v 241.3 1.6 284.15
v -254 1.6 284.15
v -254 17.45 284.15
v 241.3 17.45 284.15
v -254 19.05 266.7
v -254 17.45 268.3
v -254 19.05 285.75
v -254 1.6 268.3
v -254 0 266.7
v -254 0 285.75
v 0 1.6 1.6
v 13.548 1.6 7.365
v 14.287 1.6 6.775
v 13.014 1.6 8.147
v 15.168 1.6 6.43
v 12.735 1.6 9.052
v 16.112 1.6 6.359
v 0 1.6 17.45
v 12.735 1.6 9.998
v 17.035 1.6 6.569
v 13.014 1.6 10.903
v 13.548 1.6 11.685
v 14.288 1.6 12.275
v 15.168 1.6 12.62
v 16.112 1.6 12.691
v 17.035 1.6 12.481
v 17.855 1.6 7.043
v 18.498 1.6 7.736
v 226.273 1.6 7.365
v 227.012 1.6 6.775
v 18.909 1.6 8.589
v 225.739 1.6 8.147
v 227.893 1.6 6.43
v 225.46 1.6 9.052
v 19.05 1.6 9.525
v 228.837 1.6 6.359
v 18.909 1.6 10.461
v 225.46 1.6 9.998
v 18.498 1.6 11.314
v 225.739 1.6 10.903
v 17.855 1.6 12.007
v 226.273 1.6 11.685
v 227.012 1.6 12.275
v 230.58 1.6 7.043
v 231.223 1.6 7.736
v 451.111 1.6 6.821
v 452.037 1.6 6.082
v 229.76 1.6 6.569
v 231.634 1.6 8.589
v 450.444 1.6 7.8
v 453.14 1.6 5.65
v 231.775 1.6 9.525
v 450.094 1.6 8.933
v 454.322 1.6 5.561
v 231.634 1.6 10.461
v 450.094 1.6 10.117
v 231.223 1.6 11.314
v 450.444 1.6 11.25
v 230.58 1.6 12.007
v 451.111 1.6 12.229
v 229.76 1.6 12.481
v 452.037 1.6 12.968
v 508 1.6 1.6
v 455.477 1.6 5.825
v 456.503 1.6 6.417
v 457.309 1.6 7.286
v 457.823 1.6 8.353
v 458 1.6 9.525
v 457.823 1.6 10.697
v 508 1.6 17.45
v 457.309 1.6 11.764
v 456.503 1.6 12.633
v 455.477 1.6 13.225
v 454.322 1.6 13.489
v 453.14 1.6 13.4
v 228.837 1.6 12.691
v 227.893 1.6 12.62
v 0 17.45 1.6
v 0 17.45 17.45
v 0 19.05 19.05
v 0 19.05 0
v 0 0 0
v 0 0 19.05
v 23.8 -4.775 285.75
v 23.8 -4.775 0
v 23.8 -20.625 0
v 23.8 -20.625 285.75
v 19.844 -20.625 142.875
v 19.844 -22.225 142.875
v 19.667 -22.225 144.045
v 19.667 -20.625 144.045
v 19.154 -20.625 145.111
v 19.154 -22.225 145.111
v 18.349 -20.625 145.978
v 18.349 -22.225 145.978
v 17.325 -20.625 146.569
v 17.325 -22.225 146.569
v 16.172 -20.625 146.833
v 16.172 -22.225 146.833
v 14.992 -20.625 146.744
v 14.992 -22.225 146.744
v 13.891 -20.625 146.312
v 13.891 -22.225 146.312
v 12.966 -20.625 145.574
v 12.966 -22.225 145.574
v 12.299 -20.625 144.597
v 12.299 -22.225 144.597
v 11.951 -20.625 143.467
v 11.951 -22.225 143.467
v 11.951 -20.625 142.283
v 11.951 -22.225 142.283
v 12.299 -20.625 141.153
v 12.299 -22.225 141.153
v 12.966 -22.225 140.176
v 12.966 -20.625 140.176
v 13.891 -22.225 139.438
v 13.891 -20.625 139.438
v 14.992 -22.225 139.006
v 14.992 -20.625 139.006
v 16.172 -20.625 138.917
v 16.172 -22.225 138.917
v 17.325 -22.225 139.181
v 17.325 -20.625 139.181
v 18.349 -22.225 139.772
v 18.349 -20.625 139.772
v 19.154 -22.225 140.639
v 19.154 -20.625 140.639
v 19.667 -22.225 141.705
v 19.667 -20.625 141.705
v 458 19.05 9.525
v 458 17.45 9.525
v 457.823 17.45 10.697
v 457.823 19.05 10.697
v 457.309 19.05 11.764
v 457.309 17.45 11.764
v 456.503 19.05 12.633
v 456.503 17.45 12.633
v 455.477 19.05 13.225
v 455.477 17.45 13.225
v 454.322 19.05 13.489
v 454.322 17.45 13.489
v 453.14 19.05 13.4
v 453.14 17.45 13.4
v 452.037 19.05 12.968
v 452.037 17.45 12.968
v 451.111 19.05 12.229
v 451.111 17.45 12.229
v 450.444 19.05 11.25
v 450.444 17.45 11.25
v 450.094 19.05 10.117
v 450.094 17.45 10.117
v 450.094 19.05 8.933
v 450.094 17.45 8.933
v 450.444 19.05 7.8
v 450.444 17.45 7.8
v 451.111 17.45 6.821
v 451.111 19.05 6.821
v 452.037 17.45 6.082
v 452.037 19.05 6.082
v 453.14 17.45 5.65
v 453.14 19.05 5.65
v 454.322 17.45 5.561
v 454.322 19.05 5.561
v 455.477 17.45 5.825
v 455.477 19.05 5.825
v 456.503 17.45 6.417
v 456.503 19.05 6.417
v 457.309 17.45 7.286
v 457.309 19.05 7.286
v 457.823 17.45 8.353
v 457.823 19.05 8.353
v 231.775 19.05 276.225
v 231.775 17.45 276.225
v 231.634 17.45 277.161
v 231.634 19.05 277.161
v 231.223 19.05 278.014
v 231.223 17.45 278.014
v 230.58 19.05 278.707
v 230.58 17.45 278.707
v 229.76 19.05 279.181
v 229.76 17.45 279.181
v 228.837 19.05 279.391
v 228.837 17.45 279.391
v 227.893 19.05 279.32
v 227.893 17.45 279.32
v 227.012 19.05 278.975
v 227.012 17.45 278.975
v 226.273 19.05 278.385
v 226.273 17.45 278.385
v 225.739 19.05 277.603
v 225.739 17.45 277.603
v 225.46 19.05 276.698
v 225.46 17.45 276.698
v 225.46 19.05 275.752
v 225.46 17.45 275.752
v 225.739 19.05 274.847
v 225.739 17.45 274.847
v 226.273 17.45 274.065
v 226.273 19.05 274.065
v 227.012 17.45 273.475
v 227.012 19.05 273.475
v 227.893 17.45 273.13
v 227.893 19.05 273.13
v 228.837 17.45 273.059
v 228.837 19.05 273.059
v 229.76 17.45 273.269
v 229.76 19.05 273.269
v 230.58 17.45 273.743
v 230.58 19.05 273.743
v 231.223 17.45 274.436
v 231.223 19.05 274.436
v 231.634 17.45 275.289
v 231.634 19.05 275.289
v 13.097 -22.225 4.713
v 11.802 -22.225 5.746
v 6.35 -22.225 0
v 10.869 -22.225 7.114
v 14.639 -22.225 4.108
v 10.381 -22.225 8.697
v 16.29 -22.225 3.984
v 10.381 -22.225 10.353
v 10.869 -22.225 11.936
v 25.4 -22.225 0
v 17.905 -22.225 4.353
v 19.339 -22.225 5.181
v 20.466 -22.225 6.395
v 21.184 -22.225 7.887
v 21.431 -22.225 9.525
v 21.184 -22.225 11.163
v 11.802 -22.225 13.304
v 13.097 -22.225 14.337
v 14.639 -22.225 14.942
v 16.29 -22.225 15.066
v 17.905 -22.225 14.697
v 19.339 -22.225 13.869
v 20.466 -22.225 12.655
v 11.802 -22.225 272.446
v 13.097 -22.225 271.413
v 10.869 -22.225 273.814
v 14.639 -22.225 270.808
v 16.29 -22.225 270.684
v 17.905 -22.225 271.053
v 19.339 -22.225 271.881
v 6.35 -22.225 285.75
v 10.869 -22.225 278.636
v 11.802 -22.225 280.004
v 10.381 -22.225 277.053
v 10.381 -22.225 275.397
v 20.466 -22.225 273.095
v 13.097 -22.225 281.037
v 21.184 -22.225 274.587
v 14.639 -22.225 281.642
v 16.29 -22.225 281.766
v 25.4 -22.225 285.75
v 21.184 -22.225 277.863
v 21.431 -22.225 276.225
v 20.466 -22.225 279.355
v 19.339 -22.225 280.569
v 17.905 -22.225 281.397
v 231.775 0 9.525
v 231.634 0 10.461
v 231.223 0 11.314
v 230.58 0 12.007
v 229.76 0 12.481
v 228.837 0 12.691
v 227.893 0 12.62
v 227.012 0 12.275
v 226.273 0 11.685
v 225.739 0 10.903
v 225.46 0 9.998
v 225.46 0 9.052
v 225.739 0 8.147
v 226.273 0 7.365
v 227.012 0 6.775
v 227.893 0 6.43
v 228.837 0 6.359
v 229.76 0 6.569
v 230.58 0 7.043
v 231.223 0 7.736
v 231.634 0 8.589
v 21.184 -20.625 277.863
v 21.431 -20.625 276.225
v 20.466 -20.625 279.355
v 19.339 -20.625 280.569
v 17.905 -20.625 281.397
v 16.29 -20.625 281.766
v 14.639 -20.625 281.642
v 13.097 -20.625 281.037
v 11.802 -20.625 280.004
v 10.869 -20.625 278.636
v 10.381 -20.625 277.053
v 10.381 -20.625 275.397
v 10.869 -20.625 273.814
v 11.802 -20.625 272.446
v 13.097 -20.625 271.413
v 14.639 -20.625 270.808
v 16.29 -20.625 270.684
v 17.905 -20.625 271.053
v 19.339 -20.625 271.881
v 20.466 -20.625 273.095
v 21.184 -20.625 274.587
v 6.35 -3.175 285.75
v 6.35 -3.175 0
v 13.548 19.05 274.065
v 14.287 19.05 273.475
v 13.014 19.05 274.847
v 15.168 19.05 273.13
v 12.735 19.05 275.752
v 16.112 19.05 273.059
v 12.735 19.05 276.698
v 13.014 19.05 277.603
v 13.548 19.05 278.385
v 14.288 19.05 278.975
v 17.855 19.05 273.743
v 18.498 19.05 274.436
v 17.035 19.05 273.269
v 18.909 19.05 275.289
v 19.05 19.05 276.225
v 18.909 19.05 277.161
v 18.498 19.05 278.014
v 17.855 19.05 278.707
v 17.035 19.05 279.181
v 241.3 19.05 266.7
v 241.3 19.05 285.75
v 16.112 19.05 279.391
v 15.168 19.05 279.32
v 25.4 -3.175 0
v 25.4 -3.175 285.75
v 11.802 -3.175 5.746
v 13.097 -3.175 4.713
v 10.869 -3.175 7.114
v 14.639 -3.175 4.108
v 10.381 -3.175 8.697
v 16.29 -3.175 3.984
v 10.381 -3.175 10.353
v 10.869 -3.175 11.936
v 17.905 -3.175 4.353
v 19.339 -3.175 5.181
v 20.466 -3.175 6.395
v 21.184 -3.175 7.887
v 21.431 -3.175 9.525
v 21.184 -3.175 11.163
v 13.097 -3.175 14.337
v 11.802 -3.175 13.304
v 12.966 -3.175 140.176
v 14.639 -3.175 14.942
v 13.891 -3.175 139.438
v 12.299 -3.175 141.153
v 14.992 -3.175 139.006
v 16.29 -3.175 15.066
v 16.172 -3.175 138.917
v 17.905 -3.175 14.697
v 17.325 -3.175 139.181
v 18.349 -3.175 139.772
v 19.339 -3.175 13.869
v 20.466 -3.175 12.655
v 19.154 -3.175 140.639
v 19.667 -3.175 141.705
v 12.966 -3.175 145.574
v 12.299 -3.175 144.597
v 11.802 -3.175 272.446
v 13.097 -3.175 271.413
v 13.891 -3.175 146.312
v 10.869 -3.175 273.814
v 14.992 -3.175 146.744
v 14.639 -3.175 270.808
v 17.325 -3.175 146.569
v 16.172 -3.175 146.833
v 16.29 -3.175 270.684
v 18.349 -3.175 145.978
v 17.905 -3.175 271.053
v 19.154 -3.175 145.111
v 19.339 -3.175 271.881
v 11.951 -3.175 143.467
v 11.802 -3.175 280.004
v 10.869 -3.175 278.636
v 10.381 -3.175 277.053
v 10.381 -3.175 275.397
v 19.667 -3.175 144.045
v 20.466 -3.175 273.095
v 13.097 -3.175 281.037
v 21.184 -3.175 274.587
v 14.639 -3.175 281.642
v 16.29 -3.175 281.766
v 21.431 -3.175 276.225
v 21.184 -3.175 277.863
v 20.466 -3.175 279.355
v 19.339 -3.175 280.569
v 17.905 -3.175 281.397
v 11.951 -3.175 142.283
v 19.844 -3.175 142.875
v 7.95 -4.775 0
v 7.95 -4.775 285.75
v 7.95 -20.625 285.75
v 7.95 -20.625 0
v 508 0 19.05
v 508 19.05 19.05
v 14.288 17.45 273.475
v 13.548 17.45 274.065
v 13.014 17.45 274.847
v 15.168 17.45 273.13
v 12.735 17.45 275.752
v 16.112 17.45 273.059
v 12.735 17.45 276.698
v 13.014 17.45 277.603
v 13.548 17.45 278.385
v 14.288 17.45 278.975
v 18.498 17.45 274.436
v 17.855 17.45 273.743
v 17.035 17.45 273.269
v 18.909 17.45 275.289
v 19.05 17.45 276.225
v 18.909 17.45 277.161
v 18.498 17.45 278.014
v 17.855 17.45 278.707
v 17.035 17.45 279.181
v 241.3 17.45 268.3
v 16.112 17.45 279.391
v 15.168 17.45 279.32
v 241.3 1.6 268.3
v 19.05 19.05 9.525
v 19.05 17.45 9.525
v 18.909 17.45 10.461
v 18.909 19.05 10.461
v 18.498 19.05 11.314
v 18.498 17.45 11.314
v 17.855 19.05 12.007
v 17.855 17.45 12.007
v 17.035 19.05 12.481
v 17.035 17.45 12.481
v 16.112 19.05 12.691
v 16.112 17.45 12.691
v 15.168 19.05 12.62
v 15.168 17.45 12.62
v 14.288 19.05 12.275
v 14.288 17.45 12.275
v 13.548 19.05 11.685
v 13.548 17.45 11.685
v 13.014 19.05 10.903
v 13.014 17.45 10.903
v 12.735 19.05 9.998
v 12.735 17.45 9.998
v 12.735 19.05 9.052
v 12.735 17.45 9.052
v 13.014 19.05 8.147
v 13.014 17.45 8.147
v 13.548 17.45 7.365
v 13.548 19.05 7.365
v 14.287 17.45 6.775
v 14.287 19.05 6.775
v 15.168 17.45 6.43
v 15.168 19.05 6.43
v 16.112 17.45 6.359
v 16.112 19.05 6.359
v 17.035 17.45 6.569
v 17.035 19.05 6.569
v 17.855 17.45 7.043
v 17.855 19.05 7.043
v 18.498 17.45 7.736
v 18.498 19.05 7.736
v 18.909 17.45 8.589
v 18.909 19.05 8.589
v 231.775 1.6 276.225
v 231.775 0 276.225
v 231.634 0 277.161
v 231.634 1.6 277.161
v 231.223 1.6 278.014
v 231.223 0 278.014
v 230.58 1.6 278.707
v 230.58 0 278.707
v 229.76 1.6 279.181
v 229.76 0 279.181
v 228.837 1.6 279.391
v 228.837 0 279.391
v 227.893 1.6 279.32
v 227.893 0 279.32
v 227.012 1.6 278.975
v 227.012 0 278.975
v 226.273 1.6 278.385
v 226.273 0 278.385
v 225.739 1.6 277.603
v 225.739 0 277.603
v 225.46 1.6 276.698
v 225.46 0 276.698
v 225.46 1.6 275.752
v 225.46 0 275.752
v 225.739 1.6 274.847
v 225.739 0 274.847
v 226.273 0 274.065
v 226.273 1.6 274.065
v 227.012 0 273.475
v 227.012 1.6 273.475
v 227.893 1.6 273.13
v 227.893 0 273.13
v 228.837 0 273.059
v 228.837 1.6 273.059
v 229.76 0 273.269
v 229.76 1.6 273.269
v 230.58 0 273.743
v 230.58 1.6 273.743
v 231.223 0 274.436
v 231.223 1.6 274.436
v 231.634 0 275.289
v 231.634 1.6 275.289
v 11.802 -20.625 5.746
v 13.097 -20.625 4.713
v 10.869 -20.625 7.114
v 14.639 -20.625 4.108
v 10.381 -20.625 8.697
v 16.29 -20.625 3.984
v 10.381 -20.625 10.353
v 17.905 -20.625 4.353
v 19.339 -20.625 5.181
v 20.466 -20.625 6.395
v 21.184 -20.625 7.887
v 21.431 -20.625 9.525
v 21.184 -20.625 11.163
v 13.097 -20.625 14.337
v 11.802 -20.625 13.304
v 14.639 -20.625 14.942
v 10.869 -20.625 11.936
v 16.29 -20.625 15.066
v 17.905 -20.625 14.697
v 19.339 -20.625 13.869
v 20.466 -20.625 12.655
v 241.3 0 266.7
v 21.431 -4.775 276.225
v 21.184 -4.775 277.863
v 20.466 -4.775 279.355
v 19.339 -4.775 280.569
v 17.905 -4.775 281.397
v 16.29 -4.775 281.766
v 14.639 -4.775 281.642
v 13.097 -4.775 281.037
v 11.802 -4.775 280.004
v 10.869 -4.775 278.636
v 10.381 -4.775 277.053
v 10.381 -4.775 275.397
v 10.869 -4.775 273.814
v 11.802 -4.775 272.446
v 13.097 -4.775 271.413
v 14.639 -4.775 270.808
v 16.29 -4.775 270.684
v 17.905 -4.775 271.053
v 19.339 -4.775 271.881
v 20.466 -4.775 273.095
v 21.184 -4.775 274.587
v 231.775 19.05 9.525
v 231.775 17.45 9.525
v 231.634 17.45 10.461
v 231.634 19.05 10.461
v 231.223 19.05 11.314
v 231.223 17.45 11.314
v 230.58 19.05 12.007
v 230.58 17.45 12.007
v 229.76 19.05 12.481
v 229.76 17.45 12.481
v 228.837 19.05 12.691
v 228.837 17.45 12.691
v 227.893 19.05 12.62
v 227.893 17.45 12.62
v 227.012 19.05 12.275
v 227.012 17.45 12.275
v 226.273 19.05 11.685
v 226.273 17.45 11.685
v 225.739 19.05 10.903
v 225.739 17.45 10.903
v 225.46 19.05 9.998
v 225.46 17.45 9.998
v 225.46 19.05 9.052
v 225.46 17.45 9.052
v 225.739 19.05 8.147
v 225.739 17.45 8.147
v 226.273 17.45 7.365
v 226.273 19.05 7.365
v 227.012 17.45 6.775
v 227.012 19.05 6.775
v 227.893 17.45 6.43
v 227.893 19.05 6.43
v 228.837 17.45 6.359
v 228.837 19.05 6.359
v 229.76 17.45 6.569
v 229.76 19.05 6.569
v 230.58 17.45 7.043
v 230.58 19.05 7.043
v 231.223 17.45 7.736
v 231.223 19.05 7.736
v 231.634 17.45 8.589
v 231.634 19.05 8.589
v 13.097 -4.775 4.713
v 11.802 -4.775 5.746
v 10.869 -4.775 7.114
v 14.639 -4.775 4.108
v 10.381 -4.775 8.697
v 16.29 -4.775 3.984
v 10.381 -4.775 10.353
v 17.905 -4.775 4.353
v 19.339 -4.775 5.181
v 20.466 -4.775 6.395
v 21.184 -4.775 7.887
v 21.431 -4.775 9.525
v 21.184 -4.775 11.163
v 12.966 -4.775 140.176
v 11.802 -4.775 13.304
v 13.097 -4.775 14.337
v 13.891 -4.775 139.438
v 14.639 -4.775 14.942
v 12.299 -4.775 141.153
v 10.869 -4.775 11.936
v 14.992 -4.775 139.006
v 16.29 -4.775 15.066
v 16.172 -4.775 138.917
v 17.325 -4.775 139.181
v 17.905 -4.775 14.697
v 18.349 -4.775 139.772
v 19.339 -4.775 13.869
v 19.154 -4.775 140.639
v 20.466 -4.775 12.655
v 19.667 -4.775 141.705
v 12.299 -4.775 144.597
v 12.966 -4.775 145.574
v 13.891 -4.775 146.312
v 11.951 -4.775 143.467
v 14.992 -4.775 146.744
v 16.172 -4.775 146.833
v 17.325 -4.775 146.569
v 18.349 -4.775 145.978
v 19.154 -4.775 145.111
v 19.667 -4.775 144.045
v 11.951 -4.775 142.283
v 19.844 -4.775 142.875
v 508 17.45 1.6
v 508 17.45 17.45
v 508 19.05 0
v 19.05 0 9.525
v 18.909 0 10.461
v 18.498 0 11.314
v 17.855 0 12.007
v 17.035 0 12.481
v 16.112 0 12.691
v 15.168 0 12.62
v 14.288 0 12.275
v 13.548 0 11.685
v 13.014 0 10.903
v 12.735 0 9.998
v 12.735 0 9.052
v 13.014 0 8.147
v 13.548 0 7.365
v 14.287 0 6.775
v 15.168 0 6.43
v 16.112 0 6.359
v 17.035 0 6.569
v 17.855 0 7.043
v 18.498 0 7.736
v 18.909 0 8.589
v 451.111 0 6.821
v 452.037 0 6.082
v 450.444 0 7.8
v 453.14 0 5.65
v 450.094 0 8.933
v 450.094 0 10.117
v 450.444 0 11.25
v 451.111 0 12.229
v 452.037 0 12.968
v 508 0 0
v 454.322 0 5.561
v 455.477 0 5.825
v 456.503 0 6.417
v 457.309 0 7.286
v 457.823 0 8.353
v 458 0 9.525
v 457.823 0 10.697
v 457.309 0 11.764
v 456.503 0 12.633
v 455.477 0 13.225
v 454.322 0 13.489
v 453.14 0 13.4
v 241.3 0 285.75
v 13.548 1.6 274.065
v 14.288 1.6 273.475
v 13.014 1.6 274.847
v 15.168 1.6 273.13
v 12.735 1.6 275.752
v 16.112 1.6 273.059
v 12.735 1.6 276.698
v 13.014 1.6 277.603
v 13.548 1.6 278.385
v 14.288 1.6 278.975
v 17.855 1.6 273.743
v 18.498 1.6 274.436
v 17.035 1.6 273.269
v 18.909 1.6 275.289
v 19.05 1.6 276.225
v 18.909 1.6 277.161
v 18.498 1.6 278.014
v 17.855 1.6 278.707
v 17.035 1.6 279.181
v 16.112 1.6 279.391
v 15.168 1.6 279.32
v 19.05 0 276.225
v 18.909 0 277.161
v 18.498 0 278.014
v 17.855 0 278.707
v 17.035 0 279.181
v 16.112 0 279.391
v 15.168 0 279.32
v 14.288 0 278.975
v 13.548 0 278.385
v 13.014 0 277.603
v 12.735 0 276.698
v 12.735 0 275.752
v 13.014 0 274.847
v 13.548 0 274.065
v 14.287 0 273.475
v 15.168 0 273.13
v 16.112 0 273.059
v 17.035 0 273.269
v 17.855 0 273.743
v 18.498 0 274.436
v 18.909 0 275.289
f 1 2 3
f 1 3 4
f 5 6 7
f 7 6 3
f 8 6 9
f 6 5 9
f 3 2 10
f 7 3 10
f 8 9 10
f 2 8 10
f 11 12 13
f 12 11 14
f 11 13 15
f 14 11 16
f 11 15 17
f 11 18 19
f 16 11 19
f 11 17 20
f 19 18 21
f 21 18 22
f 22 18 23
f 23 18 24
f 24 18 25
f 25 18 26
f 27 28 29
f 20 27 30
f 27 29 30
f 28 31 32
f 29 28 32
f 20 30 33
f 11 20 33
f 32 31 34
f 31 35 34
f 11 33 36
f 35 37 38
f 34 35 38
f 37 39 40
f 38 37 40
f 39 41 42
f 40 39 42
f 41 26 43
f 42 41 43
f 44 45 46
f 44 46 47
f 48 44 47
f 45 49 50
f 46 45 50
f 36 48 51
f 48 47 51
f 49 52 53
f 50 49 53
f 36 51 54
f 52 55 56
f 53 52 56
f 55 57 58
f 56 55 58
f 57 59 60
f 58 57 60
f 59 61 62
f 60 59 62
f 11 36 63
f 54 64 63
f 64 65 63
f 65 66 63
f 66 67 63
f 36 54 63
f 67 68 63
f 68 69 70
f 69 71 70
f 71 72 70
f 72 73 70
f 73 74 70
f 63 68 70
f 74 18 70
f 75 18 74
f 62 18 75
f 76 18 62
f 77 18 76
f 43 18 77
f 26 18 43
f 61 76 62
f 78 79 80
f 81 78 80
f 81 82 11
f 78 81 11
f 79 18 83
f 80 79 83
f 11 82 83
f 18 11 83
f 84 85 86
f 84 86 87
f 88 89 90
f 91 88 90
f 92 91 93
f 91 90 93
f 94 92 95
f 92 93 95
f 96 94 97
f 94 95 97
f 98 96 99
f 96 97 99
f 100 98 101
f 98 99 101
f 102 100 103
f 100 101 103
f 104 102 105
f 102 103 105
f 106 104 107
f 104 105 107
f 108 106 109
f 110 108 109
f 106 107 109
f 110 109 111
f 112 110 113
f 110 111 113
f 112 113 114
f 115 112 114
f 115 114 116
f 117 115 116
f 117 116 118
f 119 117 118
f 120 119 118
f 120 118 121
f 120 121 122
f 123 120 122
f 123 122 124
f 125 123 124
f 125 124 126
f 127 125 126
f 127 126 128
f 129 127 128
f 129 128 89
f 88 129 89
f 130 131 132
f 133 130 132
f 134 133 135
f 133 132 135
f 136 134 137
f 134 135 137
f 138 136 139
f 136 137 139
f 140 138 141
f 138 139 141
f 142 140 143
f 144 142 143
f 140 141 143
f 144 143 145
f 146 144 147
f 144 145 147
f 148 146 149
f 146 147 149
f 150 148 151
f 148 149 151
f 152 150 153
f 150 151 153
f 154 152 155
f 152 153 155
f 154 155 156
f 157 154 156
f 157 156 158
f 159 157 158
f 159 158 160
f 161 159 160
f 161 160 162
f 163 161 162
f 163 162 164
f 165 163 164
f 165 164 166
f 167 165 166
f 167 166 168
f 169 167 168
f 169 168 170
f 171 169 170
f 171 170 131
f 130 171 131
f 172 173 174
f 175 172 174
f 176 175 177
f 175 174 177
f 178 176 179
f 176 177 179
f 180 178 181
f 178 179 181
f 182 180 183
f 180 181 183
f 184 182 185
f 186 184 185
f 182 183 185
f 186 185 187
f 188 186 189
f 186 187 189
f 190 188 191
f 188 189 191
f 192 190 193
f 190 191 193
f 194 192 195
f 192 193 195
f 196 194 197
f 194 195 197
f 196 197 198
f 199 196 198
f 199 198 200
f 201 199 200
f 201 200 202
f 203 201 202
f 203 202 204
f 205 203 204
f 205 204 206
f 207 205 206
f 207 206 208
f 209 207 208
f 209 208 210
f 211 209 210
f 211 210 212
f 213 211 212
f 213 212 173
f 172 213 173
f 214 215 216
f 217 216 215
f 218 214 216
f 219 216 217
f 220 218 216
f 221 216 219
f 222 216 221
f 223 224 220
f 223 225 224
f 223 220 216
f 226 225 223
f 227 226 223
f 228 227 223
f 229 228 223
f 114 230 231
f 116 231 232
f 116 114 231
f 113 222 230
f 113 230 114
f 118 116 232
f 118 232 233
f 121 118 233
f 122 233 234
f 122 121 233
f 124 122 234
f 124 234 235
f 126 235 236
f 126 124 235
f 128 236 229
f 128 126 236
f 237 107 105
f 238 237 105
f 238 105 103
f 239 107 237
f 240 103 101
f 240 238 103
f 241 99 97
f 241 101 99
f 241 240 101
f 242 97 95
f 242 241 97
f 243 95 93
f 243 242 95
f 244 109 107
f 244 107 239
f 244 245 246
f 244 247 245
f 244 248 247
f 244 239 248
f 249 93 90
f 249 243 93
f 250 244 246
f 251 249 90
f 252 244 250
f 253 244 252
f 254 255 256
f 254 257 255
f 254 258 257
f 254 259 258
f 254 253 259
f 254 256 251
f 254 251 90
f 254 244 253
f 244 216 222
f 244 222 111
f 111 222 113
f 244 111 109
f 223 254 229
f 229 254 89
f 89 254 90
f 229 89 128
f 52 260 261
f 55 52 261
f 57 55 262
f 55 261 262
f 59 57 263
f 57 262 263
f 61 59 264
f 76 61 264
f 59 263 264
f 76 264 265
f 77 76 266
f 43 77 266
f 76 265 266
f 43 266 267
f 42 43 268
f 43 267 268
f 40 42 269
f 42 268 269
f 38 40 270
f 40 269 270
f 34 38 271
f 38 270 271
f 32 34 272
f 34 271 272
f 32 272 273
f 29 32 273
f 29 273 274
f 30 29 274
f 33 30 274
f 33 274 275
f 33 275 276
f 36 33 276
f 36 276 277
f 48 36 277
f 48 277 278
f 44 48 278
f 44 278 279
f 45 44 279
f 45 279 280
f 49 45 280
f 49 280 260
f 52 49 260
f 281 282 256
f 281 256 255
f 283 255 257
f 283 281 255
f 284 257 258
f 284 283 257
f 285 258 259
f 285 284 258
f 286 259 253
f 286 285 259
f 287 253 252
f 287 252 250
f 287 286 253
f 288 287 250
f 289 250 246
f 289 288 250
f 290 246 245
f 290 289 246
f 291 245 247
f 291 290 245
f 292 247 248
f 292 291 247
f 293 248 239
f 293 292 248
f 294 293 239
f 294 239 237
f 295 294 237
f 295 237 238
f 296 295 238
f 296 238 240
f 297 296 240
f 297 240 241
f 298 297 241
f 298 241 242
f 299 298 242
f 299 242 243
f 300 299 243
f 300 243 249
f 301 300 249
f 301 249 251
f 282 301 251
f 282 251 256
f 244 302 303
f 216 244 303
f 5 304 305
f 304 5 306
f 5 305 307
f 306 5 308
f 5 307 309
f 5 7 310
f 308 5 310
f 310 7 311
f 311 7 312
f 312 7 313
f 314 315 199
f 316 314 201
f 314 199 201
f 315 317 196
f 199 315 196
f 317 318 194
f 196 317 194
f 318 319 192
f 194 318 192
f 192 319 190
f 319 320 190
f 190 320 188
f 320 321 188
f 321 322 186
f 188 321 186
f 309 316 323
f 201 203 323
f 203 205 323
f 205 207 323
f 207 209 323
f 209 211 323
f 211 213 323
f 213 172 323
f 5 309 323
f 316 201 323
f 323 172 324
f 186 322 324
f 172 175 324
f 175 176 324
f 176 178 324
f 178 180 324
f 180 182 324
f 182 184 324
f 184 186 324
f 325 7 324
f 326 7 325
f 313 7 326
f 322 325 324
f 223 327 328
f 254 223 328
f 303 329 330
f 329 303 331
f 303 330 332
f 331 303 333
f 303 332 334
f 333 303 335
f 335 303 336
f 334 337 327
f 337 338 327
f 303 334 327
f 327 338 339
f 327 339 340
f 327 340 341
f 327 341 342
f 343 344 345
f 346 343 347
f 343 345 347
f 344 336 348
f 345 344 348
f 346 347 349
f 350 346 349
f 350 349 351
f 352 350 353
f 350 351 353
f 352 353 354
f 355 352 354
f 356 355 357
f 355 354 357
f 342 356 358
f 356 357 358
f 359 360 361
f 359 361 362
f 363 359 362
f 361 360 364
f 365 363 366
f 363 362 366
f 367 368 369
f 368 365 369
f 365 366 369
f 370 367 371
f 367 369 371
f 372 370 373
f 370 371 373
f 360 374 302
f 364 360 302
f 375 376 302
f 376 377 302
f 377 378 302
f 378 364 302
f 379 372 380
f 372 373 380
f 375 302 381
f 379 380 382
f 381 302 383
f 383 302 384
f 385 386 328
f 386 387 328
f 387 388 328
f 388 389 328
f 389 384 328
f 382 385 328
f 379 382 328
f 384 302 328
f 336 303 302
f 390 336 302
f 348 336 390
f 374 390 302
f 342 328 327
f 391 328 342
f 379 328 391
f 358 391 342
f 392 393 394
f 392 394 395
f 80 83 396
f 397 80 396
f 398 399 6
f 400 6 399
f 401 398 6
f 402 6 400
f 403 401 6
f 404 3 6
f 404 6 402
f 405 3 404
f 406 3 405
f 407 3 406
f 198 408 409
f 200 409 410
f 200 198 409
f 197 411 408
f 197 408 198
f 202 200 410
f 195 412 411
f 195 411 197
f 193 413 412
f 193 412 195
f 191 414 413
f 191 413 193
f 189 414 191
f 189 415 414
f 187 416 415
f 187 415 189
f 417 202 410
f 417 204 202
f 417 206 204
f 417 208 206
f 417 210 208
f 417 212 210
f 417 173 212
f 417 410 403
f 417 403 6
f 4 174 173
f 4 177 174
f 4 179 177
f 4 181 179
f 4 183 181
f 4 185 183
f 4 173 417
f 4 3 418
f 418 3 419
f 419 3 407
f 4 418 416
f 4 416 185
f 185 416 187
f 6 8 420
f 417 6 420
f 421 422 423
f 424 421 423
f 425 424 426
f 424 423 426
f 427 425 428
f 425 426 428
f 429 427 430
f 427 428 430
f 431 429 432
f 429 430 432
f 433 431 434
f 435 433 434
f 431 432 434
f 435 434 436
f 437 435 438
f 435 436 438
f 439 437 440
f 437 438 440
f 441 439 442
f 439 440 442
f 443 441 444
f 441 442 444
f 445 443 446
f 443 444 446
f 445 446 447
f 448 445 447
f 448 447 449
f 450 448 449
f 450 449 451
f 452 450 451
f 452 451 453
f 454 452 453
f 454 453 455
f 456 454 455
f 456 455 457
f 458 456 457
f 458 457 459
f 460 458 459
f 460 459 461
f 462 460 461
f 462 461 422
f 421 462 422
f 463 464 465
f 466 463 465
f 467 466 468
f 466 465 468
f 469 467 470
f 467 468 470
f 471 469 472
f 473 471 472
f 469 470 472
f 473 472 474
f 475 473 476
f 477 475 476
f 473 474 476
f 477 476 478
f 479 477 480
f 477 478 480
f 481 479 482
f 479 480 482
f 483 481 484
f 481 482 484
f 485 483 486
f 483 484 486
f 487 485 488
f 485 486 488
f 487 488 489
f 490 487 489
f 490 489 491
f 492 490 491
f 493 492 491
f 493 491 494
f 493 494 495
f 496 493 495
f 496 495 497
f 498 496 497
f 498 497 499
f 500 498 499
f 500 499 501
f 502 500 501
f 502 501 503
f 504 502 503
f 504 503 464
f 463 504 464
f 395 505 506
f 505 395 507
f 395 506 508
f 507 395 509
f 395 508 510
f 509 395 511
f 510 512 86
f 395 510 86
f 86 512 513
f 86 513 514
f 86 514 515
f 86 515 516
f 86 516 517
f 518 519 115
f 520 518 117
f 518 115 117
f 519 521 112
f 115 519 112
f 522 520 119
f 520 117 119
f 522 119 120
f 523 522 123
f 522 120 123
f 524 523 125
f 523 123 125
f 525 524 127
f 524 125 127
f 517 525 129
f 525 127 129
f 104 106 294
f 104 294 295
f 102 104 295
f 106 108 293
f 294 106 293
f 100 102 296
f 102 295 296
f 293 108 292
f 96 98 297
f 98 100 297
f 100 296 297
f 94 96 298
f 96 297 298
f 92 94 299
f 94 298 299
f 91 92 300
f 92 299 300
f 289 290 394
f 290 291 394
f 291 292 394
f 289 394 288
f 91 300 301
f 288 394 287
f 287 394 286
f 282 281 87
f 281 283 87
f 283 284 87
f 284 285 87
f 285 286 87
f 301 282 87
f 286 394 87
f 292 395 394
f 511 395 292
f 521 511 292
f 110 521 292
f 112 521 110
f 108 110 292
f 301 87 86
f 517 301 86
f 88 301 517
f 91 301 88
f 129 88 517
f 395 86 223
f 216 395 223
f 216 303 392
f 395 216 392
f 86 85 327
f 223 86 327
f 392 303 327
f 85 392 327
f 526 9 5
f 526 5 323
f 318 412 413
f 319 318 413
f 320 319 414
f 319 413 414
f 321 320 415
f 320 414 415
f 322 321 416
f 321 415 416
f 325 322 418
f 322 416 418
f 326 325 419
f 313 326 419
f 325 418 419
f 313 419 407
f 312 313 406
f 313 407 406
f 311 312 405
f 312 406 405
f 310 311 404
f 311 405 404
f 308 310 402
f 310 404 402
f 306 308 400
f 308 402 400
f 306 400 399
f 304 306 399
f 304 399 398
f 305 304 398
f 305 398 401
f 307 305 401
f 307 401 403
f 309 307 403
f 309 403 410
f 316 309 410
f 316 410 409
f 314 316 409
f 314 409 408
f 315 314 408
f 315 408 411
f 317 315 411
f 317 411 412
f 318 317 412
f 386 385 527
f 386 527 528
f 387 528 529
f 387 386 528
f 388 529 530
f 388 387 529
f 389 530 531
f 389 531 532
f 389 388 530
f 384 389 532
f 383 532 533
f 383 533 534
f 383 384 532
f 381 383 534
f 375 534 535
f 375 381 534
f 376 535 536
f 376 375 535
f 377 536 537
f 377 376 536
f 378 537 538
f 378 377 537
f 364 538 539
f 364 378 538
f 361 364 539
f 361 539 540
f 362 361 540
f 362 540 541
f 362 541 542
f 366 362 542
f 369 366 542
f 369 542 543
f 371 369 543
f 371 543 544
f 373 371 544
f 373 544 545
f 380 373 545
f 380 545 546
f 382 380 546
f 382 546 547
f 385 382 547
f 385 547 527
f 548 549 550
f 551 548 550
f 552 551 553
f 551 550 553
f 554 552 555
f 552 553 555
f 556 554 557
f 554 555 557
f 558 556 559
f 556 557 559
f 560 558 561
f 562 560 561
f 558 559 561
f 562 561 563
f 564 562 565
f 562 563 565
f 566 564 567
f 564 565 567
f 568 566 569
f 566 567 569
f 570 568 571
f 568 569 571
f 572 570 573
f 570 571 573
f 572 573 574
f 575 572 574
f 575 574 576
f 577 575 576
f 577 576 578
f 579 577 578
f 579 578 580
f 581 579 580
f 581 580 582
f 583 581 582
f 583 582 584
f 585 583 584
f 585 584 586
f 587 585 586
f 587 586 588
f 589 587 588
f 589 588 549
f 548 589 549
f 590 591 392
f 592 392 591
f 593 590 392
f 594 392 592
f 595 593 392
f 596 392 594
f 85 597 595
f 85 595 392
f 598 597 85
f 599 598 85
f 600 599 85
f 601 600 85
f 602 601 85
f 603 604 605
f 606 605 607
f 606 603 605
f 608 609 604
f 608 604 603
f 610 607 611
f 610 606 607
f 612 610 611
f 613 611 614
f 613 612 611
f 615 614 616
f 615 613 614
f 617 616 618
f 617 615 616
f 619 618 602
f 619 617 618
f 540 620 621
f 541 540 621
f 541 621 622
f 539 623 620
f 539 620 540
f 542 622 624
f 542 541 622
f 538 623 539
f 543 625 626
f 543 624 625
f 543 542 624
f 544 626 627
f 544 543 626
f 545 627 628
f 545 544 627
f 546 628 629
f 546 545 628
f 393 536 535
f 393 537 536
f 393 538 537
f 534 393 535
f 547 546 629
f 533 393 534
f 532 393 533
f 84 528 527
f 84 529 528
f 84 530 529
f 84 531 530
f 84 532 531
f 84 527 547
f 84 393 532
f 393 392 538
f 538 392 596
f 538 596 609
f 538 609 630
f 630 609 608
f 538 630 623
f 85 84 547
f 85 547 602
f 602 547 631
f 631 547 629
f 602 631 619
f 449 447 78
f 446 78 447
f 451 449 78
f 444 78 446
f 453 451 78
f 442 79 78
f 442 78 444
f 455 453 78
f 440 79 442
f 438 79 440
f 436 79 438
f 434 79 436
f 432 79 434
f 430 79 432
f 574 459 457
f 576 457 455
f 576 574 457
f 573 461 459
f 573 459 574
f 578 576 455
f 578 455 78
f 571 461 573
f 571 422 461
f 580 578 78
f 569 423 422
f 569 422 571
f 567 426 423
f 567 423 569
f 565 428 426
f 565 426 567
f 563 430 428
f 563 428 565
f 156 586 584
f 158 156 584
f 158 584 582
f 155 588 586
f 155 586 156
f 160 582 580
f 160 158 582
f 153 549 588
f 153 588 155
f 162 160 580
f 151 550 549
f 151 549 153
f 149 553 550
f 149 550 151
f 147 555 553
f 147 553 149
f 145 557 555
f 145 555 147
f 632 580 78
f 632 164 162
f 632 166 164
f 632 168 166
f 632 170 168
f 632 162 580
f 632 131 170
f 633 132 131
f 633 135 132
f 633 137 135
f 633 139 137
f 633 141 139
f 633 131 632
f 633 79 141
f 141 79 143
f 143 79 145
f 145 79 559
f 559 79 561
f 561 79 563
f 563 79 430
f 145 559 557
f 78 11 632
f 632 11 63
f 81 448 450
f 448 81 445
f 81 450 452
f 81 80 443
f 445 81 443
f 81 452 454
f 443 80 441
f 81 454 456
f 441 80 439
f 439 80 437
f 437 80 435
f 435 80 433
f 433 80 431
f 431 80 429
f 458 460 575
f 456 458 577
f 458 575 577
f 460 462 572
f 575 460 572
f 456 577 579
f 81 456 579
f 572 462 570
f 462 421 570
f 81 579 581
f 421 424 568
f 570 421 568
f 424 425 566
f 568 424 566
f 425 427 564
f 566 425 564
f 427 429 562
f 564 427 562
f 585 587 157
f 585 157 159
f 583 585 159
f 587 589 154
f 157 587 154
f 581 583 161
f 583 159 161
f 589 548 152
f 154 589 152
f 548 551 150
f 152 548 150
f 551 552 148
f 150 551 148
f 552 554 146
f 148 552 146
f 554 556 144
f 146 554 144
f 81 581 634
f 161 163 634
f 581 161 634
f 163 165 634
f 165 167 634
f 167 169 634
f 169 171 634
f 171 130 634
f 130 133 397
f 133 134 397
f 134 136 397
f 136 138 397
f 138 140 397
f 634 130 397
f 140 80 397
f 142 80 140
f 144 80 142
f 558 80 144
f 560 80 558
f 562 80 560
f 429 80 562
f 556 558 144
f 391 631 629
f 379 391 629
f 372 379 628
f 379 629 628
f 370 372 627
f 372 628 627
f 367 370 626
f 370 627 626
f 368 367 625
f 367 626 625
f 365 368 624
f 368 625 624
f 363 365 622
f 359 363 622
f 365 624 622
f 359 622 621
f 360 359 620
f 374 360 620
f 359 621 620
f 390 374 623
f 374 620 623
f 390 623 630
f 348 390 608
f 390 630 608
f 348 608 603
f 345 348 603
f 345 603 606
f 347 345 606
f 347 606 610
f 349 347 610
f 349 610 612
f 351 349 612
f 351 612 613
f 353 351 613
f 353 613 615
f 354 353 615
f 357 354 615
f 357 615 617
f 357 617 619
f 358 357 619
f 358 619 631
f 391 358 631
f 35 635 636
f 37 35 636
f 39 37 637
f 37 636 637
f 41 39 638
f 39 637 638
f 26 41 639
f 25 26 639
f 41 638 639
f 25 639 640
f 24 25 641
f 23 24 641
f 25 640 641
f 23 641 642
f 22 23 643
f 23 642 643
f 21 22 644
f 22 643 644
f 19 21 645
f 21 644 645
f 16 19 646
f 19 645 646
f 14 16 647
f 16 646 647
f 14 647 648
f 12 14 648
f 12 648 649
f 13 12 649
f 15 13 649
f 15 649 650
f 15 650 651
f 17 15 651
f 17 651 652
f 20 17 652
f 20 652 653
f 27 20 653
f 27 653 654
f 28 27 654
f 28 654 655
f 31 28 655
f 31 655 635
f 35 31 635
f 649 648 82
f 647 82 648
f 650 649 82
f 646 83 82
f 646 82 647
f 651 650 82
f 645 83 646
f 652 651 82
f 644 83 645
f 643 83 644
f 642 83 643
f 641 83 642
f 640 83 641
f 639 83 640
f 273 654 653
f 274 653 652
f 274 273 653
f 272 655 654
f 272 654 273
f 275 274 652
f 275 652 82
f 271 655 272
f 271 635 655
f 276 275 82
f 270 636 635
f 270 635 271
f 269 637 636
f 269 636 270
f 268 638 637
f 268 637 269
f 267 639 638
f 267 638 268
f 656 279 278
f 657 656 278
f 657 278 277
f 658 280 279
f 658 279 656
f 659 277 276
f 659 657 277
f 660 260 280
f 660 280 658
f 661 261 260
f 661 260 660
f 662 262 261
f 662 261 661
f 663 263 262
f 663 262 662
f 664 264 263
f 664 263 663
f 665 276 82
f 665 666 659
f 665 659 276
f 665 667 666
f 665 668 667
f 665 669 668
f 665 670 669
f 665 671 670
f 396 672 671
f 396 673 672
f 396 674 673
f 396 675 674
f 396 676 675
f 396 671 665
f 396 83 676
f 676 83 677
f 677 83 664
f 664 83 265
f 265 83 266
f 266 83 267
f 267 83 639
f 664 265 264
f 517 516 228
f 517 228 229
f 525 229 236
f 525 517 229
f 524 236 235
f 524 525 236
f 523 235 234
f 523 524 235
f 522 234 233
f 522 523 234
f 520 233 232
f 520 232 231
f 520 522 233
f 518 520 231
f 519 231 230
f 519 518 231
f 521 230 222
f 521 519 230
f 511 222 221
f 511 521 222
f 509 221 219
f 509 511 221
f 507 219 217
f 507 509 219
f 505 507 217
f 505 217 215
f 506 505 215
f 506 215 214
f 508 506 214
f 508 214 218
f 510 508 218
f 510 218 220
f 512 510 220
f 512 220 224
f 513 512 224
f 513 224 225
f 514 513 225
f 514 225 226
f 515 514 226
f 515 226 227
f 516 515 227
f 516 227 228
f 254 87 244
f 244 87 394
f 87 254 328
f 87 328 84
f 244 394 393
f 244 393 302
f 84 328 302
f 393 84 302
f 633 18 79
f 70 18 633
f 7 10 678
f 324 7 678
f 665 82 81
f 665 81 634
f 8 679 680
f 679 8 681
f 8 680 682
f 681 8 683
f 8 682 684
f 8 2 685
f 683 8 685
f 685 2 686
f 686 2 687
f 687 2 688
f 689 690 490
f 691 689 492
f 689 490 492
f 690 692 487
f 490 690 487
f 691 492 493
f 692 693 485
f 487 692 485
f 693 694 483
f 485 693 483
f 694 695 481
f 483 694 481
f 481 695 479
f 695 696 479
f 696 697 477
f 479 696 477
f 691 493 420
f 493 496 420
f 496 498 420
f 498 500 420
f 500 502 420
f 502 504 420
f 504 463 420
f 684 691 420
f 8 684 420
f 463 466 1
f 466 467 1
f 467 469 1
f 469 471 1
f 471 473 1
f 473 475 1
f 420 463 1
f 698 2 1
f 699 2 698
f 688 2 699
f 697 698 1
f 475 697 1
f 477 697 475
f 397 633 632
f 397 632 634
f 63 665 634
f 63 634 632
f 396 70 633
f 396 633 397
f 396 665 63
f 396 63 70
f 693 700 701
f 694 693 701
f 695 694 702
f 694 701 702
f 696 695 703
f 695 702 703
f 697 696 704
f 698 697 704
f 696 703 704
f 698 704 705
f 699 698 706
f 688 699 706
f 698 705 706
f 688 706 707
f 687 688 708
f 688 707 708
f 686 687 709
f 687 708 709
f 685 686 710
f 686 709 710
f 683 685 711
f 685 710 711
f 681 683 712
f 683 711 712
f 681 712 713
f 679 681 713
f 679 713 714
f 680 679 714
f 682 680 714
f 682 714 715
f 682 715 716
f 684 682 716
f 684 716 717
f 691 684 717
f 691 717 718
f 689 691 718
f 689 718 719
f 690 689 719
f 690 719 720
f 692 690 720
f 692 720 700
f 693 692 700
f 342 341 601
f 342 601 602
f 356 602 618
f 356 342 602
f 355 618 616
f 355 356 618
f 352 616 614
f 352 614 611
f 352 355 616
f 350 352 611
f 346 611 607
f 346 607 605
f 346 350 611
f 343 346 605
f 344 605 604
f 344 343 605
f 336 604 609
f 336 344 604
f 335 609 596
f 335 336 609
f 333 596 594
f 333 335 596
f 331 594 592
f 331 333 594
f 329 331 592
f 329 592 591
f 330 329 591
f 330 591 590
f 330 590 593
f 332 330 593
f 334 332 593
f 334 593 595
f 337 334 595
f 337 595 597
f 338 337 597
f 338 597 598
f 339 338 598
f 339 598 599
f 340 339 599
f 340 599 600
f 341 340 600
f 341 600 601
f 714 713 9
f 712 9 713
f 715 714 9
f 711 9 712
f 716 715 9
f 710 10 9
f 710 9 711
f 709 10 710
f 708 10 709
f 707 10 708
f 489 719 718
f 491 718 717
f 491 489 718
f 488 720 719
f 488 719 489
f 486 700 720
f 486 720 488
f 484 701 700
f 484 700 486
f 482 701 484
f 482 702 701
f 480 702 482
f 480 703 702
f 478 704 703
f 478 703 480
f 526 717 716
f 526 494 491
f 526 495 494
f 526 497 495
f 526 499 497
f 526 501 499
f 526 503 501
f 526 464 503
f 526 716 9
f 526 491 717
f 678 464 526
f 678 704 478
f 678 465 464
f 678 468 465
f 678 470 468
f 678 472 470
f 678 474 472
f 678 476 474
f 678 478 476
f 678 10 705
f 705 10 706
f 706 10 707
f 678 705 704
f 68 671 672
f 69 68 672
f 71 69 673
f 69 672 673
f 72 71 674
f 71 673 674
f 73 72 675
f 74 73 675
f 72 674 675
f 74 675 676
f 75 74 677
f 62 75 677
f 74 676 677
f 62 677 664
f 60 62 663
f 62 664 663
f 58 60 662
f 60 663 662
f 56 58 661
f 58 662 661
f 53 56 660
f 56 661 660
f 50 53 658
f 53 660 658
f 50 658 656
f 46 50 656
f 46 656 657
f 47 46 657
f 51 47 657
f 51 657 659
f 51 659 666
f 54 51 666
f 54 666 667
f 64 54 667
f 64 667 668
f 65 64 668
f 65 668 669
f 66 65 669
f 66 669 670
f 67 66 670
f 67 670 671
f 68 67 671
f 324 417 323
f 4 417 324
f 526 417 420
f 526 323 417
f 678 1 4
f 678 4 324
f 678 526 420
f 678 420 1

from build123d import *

# Parameters (mm, degrees)
F0_W      = 508
F0_H      = 19.05
F1_DEPTH  = 19.05
F2_T      = -1.6002
F3_R      = 3.175
F4_DEPTH  = 19.051
F7_R      = 5.55625
F8_DEPTH  = 19.05
F9_T      = -1.6002
F10_W     = 495.3
F10_H     = 19.05
F10_R     = 3.175
F11_DEPTH = 19.05
F12_T     = -1.6002
F13_R     = 3.96875
F14_DEPTH = 25.4
F15_R     = 3.9751
F16_DEPTH = 19.051


# Not quite as in the source:
# - a feature names something its author has since deleted; it is built from what else it names


with BuildPart() as f1:
    # F0 (on Front) → F1 (new body)
    with BuildSketch(Plane.XZ):
        with Locations((254, 9.525)):
            Rectangle(F0_W, F0_H)
    extrude(amount=-F1_DEPTH)

    # F2
    f2_openings = [f1.faces().sort_by_distance(p)[0] for p in [
        (508, 9.525, 9.525),
        (0, 9.525, 9.525),
    ]]
    offset(amount=F2_T, openings=f2_openings)

    # F3 (on face) → F4 (cut, through all)
    with BuildSketch(Plane.XZ):
        with Locations((228.6, 9.525)):
            Circle(F3_R)
        with Locations((15.875, 9.525)):
            Circle(F3_R)
    extrude(amount=-F4_DEPTH, mode=Mode.SUBTRACT)

    # F15 (on face) → F16 (cut, through all)
    with BuildSketch(Plane.XZ):
        with Locations((454.025, 9.525)):
            Circle(F15_R)
    extrude(amount=-F16_DEPTH, mode=Mode.SUBTRACT)


with BuildPart() as f8:
    # F7 (on offset) → F8 (new body)
    with BuildSketch(Plane.XZ.offset(3.175)):
        Polygon((25.4, 285.75), (6.35, 285.75), (6.35, 276.225), (6.35, 0), (25.4, 0), (25.4, 276.225), align=None)
        with Locations((15.875, 9.525)):
            Circle(F7_R, mode=Mode.SUBTRACT)
        with Locations((15.875, 276.225)):
            Circle(F7_R, mode=Mode.SUBTRACT)
    extrude(amount=F8_DEPTH)

    # F9
    f9_openings = [f8.faces().sort_by_distance(p)[0] for p in [
        (10.31875, -12.7, 276.225),
        (15.875, -12.7, 0),
        (10.31875, -12.7, 9.525),
        (15.875, -12.7, 285.75),
    ]]
    offset(amount=F9_T, openings=f9_openings)

    # F13 (on face) → F14 (cut)
    with BuildSketch(Plane.XZ.offset(22.225)):
        with Locations((15.875, 142.875)):
            Circle(F13_R)
    extrude(amount=-F14_DEPTH, mode=Mode.SUBTRACT)


with BuildPart() as f11:
    # F10 (on Front) → F11 (new body)
    with BuildSketch(Plane.XZ):
        with Locations((-6.35, 276.225)):
            Rectangle(F10_W, F10_H)
        with Locations((15.875, 276.225)):
            Circle(F10_R, mode=Mode.SUBTRACT)
        with Locations((228.6, 276.225)):
            Circle(F10_R, mode=Mode.SUBTRACT)
    extrude(amount=-F11_DEPTH)

    # F12
    f12_openings = [f11.faces().sort_by_distance(p)[0] for p in [
        (-254, 9.525, 276.225),
        (12.7, 9.525, 276.225),
        (241.3, 9.525, 276.225),
        (225.425, 9.525, 276.225),
    ]]
    offset(amount=F12_T, openings=f12_openings)


solid = Compound([f1.part, f8.part, f11.part])
